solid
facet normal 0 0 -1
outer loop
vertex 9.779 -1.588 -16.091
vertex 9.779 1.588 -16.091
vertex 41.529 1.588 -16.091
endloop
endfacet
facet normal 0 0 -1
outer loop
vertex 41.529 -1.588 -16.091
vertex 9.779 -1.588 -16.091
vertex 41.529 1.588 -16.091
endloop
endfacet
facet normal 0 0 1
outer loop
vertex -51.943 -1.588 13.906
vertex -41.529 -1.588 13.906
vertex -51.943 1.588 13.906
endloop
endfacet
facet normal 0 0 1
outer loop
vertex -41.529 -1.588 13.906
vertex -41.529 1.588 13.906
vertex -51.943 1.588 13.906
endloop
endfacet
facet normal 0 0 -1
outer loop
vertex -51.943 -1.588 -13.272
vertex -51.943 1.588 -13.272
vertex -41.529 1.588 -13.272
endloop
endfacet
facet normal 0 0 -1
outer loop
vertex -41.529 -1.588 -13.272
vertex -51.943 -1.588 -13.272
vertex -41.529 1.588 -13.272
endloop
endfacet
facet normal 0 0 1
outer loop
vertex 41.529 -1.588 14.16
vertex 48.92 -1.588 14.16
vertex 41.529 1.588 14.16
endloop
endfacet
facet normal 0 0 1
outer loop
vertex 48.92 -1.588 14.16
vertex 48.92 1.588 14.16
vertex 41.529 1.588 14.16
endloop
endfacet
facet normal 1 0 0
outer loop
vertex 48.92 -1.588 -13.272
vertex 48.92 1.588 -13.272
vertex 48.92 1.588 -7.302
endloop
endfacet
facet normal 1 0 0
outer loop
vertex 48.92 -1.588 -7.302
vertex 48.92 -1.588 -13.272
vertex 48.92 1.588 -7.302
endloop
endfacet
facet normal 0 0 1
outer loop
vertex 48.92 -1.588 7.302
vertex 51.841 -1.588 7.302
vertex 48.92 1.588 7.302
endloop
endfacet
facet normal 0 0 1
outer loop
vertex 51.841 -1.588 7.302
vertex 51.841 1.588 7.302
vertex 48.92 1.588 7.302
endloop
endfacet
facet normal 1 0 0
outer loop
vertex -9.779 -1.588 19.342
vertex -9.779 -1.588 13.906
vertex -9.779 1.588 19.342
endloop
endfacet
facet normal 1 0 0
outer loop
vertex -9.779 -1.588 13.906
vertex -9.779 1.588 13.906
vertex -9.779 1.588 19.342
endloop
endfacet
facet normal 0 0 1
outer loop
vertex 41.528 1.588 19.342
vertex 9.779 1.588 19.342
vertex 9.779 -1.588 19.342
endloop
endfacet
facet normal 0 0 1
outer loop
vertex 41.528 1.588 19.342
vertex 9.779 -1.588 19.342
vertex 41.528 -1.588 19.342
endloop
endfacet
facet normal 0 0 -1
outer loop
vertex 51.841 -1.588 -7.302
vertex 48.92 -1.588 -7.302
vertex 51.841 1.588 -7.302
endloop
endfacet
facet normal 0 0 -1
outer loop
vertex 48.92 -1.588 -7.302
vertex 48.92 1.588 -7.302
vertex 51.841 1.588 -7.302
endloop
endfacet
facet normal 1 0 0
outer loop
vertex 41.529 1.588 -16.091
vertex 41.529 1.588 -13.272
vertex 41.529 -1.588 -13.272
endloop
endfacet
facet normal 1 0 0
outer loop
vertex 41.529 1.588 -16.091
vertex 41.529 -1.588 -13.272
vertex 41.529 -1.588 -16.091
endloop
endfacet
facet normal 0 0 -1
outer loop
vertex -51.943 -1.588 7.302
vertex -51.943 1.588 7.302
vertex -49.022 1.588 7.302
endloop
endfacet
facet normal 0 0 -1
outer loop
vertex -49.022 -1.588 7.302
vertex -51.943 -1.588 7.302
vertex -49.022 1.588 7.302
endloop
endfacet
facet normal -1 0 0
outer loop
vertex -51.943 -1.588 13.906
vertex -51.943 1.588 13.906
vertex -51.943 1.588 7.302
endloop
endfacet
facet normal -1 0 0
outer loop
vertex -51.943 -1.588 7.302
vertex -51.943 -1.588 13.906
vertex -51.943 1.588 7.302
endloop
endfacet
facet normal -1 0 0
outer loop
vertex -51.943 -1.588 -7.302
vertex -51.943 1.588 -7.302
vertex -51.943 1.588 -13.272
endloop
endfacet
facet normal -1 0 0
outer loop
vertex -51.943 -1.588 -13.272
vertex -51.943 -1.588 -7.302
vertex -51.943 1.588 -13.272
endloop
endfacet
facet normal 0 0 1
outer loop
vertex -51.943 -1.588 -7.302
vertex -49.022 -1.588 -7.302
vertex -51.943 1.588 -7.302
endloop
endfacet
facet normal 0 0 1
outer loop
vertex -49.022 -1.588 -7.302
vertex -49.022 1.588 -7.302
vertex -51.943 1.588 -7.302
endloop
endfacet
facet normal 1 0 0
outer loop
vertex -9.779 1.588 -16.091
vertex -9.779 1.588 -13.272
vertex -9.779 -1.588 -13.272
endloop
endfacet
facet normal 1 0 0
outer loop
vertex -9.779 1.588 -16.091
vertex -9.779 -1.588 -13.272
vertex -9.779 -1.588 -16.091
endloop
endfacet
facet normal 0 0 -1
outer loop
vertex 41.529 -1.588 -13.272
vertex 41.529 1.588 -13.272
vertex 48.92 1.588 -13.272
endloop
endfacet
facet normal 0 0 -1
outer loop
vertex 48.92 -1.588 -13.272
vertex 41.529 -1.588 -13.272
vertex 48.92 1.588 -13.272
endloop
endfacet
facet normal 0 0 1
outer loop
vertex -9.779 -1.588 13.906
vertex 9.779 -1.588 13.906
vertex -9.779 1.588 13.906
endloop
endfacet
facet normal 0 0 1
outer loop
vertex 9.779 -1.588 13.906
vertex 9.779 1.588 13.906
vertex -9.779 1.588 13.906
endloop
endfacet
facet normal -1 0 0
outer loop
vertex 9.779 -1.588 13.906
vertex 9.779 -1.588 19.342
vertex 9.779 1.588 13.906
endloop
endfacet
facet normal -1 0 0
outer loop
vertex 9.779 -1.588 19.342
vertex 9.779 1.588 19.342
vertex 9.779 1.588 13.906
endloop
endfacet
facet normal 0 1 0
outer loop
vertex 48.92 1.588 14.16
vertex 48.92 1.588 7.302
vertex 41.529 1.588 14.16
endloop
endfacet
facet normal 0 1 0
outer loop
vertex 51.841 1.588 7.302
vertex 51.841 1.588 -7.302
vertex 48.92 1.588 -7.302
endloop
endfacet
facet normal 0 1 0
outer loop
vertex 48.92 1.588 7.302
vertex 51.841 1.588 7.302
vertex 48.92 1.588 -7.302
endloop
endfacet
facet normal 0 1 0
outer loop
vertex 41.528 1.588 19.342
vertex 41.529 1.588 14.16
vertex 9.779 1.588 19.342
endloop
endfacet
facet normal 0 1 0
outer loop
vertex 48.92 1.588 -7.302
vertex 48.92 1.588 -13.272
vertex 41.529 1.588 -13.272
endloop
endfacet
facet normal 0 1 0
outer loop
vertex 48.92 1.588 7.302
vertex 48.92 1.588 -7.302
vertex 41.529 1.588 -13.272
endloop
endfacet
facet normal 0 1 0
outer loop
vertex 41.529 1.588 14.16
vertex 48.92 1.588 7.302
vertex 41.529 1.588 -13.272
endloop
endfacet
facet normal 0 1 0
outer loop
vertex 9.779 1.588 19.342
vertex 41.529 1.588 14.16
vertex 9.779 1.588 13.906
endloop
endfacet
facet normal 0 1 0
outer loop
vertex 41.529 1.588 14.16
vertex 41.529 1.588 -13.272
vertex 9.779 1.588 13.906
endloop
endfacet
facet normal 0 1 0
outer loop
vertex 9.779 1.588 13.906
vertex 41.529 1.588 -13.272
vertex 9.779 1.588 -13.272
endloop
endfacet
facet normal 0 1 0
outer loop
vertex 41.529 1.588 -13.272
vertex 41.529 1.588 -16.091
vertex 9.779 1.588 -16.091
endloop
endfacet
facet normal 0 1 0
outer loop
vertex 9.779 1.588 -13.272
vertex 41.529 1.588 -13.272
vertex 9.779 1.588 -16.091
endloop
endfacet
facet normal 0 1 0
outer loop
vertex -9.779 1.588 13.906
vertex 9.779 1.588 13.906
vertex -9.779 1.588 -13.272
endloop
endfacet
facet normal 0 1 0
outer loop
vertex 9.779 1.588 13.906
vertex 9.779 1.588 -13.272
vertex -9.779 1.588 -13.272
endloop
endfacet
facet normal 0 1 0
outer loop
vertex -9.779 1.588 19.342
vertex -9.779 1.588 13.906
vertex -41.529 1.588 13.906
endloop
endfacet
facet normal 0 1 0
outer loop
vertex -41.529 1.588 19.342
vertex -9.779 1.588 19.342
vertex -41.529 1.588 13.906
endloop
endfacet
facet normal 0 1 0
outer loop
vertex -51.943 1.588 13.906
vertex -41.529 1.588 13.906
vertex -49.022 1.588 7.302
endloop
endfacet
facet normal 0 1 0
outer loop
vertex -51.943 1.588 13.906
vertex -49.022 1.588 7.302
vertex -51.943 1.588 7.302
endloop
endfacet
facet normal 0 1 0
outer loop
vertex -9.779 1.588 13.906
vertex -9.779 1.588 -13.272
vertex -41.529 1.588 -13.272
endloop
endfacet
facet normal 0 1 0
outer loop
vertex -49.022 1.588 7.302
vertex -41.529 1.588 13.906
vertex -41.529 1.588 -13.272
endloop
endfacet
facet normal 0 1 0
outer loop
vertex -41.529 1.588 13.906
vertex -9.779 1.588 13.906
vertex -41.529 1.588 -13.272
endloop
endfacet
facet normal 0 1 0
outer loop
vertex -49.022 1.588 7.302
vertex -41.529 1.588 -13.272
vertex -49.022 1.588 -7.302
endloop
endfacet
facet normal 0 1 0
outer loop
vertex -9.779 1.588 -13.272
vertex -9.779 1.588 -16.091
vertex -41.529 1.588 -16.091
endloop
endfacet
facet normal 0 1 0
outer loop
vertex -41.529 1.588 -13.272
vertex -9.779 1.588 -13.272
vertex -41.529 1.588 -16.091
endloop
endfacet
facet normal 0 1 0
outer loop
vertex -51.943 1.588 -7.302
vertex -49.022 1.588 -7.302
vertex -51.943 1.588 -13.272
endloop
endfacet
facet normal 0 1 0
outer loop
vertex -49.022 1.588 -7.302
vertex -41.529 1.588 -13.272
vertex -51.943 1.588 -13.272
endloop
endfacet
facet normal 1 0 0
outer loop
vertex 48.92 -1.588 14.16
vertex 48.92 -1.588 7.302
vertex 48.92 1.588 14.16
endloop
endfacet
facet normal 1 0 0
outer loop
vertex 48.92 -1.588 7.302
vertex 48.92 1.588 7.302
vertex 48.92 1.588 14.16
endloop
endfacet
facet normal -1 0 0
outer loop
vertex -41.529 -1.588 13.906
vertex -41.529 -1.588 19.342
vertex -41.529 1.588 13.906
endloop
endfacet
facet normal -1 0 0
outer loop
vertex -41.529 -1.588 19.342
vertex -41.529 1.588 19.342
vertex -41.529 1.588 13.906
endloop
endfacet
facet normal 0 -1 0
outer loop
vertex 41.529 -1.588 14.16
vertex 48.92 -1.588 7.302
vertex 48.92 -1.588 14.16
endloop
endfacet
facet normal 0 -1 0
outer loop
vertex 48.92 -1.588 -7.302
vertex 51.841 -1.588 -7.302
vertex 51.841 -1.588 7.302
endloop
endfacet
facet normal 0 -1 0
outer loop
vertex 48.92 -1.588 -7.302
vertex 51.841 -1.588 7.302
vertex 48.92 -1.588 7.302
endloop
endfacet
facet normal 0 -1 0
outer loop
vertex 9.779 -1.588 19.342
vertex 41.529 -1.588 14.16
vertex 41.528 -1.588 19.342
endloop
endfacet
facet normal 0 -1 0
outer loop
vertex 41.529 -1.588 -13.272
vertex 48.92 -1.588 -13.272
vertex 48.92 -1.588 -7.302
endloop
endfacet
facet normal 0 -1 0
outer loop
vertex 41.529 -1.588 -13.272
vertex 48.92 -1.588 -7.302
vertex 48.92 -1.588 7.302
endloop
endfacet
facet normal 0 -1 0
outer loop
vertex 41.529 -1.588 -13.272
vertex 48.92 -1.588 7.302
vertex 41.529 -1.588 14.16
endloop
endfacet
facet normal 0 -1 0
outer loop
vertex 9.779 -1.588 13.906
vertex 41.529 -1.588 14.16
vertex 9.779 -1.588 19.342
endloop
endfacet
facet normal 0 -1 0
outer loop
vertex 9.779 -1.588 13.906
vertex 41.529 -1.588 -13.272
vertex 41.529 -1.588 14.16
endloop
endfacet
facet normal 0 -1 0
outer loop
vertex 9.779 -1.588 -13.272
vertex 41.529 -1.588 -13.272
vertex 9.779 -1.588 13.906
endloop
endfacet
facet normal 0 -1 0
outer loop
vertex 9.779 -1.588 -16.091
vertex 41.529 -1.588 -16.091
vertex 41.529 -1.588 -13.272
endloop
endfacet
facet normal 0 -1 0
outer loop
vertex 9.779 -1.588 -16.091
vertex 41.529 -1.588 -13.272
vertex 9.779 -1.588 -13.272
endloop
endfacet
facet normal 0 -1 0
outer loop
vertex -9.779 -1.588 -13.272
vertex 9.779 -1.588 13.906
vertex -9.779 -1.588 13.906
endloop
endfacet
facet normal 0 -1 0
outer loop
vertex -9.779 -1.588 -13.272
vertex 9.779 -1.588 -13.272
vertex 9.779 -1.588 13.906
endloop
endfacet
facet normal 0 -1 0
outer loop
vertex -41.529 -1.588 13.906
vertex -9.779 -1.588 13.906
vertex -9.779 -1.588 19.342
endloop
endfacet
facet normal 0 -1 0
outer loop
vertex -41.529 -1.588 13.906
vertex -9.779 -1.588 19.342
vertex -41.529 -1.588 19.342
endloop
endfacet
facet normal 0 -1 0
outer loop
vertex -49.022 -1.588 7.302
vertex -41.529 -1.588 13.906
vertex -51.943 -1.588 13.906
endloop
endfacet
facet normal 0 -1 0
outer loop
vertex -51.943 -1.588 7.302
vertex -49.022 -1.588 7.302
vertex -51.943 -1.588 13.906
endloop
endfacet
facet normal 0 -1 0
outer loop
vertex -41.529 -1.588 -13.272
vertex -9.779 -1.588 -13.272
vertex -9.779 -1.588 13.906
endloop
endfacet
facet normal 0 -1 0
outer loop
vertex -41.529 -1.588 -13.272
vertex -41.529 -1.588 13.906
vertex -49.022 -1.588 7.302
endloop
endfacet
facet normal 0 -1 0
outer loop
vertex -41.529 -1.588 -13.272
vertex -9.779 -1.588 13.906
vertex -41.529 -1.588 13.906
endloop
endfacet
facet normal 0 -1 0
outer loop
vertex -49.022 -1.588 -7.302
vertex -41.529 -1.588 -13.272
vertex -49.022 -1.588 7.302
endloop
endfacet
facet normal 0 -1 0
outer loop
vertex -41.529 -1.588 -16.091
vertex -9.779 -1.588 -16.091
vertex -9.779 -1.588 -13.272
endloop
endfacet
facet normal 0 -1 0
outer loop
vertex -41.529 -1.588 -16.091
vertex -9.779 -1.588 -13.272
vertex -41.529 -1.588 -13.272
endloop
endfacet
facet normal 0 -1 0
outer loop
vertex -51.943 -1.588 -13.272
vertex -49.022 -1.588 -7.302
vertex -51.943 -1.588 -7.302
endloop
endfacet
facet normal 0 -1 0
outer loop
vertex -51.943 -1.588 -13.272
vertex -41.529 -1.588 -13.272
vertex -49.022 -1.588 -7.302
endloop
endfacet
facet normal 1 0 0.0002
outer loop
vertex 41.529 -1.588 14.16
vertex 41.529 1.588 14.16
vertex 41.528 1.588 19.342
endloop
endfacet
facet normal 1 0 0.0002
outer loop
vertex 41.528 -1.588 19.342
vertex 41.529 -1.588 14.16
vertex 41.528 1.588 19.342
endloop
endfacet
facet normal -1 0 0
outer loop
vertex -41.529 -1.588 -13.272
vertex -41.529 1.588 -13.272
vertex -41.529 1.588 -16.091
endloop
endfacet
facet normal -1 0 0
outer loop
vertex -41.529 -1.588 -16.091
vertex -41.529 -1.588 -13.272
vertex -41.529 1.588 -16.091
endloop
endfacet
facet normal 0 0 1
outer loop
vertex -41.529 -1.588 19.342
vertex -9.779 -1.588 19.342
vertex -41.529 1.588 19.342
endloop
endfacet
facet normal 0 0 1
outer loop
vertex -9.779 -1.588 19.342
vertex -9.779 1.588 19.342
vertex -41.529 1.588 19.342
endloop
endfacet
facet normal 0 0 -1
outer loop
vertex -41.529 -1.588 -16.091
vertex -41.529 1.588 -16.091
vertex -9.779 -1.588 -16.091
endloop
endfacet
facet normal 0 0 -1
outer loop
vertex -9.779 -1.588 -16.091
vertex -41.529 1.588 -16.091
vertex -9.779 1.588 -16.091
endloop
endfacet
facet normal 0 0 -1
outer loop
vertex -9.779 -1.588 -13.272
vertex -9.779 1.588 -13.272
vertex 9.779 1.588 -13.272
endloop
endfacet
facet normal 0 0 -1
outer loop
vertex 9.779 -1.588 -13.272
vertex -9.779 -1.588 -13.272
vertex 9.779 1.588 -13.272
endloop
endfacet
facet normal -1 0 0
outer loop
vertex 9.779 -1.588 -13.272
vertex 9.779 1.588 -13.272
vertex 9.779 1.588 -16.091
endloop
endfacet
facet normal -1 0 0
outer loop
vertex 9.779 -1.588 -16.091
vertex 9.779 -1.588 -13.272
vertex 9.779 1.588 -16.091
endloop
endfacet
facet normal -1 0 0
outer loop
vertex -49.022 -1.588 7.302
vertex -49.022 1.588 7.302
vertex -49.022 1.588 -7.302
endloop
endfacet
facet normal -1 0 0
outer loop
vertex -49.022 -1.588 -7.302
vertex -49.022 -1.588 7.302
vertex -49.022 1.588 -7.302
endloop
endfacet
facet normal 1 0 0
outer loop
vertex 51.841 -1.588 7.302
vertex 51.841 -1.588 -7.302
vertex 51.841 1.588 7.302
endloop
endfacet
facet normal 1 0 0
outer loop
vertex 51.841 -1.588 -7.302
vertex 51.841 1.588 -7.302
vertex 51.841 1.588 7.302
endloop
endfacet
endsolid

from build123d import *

# Parameters (mm, degrees)
BOSS_EXTRUDE1_DEPTH = 1.5875
SKETCH2_W           = 10.414
SKETCH2_H           = 0.635
SKETCH2_W_2         = 19.558
SKETCH2_W_3         = 7.3914
SKETCH2_H_2         = 0.889
CUT_EXTRUDE1_DEPTH  = 56.607220803
SKETCH3_W           = 31.75
SKETCH3_H           = 0.635
CUT_EXTRUDE3_DEPTH  = 56.607220803


with BuildPart() as part:
    # Sketch1 → Boss-Extrude1 (new, symmetric)
    with BuildSketch(Plane(origin=(0, 0, 0), x_dir=(1, 0, 0), z_dir=(0, 1, 0))):
        Polygon((-49.022, -7.3025), (-49.022, 7.3025), (-51.943, 7.3025), (-51.943, 13.9065), (-41.529, 13.9065), (-41.529, 16.7259), (-9.779, 16.7259), (-9.779, 13.9065), (9.779, 13.9065), (9.779, 16.7259), (41.529, 16.7259), (41.529, 14.1605), (48.9204, 14.1605), (48.9204, 7.3025), (51.8414, 7.3025), (51.8414, -7.3025), (48.9204, -7.3025), (48.9204, -14.1605), (41.529, -14.1605), (41.527983985, -19.596099905), (9.779, -19.3421), (9.779, -13.9065), (-9.779, -13.9065), (-9.779, -19.3421), (-41.529, -19.3421), (-41.529, -13.9065), (-51.943, -13.9065), (-51.943, -7.3025), align=None)
    extrude(amount=BOSS_EXTRUDE1_DEPTH, both=True)

    # Sketch2 → Cut-Extrude1 (cut, through all)
    with BuildSketch(Plane(origin=(0, 1.5875, 0), x_dir=(1, 0, 0), z_dir=(0, 1, 0))):
        with Locations((-46.736, 13.589)):
            Rectangle(SKETCH2_W, SKETCH2_H)
        with Locations((0, 13.589)):
            Rectangle(SKETCH2_W_2, SKETCH2_H)
        with Locations((45.2247, 13.716)):
            Rectangle(SKETCH2_W_3, SKETCH2_H_2)
    extrude(amount=-CUT_EXTRUDE1_DEPTH, mode=Mode.SUBTRACT)

    # Sketch3 → Cut-Extrude3 (cut, through all)
    with BuildSketch(Plane(origin=(0, 1.5875, 0), x_dir=(1, 0, 0), z_dir=(0, 1, 0))):
        with Locations((-25.654, 16.4084)):
            Rectangle(SKETCH3_W, SKETCH3_H)
        Polygon((9.779, -19.3421), (41.528031462, -19.3421), (41.527983985, -19.596099905), (9.779096987, -19.596099905), align=None)
        with Locations((25.654, 16.4084)):
            Rectangle(SKETCH3_W, SKETCH3_H)
    extrude(amount=-CUT_EXTRUDE3_DEPTH, mode=Mode.SUBTRACT)


solid = part.part
